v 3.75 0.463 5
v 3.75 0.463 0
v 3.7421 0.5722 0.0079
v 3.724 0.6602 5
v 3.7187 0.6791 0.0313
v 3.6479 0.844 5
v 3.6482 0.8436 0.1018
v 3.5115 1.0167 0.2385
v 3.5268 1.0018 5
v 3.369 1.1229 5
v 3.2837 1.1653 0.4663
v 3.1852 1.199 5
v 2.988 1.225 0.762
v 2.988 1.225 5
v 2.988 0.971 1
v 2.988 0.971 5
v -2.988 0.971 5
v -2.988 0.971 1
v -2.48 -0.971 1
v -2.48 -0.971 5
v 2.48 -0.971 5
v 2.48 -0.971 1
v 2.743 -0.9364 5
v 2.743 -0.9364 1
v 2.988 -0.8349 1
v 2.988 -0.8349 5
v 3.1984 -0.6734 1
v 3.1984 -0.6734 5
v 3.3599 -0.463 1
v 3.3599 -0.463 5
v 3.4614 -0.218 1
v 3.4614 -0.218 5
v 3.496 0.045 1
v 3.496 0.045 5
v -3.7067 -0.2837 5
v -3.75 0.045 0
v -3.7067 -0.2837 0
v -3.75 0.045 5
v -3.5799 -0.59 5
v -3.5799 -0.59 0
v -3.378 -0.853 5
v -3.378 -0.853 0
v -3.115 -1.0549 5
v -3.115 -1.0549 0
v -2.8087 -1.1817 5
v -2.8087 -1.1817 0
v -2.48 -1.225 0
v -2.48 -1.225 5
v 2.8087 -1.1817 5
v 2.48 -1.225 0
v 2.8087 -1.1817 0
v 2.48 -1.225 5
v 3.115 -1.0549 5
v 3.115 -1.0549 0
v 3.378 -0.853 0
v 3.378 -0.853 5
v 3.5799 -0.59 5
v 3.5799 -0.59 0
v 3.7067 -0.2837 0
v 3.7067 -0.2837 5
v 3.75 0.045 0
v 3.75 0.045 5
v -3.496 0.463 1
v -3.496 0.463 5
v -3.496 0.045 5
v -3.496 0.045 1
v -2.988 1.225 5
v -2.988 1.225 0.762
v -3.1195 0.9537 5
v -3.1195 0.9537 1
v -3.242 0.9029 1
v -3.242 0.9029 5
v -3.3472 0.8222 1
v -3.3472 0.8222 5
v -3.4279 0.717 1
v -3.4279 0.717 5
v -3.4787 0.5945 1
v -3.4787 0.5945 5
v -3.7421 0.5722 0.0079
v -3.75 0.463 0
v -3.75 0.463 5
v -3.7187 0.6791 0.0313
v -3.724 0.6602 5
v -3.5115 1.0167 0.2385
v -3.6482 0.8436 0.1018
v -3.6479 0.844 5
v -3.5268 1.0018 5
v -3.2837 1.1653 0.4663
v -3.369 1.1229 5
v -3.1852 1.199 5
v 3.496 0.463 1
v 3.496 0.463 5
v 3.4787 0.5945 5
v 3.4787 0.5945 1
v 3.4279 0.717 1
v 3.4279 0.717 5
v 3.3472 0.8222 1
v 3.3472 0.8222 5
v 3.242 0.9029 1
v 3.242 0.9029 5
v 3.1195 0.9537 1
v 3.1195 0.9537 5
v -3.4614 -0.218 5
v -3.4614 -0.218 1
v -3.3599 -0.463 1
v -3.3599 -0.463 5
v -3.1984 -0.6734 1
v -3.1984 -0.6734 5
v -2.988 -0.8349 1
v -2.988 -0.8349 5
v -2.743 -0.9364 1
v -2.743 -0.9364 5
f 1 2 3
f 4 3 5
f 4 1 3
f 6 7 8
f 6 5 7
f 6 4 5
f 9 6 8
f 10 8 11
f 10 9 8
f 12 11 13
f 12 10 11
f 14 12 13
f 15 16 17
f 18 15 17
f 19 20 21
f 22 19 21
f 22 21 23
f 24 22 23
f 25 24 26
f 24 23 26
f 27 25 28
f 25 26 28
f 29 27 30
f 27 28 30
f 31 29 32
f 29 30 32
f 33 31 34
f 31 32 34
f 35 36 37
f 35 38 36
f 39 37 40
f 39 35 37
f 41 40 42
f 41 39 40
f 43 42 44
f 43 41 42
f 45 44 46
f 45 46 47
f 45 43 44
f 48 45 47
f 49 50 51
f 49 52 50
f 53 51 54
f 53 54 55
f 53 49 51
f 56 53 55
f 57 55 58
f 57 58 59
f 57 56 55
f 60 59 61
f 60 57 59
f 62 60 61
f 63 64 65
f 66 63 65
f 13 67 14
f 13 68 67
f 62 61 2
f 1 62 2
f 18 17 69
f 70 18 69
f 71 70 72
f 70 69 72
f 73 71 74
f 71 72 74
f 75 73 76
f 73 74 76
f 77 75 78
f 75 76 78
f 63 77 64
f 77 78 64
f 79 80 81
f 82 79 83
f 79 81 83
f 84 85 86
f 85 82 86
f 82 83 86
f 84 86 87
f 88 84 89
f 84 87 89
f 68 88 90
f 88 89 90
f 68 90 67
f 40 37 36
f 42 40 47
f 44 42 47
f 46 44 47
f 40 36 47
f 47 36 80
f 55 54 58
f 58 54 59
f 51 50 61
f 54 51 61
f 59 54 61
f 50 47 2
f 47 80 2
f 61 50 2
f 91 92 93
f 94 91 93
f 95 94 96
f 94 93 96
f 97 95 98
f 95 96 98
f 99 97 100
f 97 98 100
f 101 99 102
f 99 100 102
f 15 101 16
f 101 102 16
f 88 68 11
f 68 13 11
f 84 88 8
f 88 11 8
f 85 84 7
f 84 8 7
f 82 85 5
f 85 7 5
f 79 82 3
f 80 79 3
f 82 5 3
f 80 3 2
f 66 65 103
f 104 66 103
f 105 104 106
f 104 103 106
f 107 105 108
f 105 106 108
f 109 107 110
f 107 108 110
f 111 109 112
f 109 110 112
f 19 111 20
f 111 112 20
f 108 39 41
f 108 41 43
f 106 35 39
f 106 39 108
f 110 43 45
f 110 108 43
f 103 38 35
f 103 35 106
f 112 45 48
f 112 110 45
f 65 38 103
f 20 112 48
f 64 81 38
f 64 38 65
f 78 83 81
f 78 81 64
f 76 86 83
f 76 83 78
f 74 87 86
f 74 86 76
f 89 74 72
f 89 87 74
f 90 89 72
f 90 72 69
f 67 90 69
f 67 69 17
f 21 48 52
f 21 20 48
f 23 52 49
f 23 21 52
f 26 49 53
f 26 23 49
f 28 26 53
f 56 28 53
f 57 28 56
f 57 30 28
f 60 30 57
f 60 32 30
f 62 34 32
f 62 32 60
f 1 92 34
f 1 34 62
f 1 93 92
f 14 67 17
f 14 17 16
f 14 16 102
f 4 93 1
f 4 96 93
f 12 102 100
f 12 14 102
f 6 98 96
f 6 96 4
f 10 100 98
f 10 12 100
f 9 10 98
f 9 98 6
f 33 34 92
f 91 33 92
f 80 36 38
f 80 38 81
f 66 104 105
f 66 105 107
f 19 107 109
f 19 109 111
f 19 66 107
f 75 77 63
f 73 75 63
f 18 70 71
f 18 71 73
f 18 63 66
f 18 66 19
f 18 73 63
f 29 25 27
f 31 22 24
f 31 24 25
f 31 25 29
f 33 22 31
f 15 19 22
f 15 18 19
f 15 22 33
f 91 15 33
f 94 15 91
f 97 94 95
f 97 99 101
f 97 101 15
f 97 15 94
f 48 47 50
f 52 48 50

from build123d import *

# Parameters (mm, degrees)
SKETCH1_W           = 7.5
SKETCH1_H           = 2.45
BOSS_EXTRUDE1_DEPTH = 5
FILLET1_R           = 0.762
FILLET2_R           = 1.27
CUT_EXTRUDE1_DEPTH  = 4


with BuildPart() as part:
    # Sketch1 → Boss-Extrude1 (new body)
    with BuildSketch(Plane.XY):
        Rectangle(SKETCH1_W, SKETCH1_H)
    extrude(amount=BOSS_EXTRUDE1_DEPTH)

    # Fillet1
    fillet1_edges = [part.edges().sort_by_distance(p)[0] for p in [
        (0, 1.225, 0),
        (-3.75, 1.225, 2.5),
        (3.75, 1.225, 2.5),
    ]]
    fillet(fillet1_edges, radius=FILLET1_R)

    # Fillet2
    fillet2_edges = [part.edges().sort_by_distance(p)[0] for p in [
        (3.75, -1.225, 2.5),
        (-3.75, -1.225, 2.5),
    ]]
    fillet(fillet2_edges, radius=FILLET2_R)

    # Sketch2 → Cut-Extrude1 (cut)
    with BuildSketch(Plane.XY.offset(5)):
        with BuildLine():
            Line((3.496, 0.045), (3.496, 0.463))
            ThreePointArc((3.496, 0.463), (3.347210245, 0.822210245), (2.988, 0.971))
            Line((2.988, 0.971), (-2.988, 0.971))
            ThreePointArc((-2.988, 0.971), (-3.347210245, 0.822210245), (-3.496, 0.463))
            Line((-3.496, 0.463), (-3.496, 0.045))
            ThreePointArc((-3.496, 0.045), (-3.19842049, -0.67342049), (-2.48, -0.971))
            Line((-2.48, -0.971), (2.48, -0.971))
            ThreePointArc((2.48, -0.971), (3.19842049, -0.67342049), (3.496, 0.045))
        make_face()
    extrude(amount=-CUT_EXTRUDE1_DEPTH, mode=Mode.SUBTRACT)


solid = part.part
